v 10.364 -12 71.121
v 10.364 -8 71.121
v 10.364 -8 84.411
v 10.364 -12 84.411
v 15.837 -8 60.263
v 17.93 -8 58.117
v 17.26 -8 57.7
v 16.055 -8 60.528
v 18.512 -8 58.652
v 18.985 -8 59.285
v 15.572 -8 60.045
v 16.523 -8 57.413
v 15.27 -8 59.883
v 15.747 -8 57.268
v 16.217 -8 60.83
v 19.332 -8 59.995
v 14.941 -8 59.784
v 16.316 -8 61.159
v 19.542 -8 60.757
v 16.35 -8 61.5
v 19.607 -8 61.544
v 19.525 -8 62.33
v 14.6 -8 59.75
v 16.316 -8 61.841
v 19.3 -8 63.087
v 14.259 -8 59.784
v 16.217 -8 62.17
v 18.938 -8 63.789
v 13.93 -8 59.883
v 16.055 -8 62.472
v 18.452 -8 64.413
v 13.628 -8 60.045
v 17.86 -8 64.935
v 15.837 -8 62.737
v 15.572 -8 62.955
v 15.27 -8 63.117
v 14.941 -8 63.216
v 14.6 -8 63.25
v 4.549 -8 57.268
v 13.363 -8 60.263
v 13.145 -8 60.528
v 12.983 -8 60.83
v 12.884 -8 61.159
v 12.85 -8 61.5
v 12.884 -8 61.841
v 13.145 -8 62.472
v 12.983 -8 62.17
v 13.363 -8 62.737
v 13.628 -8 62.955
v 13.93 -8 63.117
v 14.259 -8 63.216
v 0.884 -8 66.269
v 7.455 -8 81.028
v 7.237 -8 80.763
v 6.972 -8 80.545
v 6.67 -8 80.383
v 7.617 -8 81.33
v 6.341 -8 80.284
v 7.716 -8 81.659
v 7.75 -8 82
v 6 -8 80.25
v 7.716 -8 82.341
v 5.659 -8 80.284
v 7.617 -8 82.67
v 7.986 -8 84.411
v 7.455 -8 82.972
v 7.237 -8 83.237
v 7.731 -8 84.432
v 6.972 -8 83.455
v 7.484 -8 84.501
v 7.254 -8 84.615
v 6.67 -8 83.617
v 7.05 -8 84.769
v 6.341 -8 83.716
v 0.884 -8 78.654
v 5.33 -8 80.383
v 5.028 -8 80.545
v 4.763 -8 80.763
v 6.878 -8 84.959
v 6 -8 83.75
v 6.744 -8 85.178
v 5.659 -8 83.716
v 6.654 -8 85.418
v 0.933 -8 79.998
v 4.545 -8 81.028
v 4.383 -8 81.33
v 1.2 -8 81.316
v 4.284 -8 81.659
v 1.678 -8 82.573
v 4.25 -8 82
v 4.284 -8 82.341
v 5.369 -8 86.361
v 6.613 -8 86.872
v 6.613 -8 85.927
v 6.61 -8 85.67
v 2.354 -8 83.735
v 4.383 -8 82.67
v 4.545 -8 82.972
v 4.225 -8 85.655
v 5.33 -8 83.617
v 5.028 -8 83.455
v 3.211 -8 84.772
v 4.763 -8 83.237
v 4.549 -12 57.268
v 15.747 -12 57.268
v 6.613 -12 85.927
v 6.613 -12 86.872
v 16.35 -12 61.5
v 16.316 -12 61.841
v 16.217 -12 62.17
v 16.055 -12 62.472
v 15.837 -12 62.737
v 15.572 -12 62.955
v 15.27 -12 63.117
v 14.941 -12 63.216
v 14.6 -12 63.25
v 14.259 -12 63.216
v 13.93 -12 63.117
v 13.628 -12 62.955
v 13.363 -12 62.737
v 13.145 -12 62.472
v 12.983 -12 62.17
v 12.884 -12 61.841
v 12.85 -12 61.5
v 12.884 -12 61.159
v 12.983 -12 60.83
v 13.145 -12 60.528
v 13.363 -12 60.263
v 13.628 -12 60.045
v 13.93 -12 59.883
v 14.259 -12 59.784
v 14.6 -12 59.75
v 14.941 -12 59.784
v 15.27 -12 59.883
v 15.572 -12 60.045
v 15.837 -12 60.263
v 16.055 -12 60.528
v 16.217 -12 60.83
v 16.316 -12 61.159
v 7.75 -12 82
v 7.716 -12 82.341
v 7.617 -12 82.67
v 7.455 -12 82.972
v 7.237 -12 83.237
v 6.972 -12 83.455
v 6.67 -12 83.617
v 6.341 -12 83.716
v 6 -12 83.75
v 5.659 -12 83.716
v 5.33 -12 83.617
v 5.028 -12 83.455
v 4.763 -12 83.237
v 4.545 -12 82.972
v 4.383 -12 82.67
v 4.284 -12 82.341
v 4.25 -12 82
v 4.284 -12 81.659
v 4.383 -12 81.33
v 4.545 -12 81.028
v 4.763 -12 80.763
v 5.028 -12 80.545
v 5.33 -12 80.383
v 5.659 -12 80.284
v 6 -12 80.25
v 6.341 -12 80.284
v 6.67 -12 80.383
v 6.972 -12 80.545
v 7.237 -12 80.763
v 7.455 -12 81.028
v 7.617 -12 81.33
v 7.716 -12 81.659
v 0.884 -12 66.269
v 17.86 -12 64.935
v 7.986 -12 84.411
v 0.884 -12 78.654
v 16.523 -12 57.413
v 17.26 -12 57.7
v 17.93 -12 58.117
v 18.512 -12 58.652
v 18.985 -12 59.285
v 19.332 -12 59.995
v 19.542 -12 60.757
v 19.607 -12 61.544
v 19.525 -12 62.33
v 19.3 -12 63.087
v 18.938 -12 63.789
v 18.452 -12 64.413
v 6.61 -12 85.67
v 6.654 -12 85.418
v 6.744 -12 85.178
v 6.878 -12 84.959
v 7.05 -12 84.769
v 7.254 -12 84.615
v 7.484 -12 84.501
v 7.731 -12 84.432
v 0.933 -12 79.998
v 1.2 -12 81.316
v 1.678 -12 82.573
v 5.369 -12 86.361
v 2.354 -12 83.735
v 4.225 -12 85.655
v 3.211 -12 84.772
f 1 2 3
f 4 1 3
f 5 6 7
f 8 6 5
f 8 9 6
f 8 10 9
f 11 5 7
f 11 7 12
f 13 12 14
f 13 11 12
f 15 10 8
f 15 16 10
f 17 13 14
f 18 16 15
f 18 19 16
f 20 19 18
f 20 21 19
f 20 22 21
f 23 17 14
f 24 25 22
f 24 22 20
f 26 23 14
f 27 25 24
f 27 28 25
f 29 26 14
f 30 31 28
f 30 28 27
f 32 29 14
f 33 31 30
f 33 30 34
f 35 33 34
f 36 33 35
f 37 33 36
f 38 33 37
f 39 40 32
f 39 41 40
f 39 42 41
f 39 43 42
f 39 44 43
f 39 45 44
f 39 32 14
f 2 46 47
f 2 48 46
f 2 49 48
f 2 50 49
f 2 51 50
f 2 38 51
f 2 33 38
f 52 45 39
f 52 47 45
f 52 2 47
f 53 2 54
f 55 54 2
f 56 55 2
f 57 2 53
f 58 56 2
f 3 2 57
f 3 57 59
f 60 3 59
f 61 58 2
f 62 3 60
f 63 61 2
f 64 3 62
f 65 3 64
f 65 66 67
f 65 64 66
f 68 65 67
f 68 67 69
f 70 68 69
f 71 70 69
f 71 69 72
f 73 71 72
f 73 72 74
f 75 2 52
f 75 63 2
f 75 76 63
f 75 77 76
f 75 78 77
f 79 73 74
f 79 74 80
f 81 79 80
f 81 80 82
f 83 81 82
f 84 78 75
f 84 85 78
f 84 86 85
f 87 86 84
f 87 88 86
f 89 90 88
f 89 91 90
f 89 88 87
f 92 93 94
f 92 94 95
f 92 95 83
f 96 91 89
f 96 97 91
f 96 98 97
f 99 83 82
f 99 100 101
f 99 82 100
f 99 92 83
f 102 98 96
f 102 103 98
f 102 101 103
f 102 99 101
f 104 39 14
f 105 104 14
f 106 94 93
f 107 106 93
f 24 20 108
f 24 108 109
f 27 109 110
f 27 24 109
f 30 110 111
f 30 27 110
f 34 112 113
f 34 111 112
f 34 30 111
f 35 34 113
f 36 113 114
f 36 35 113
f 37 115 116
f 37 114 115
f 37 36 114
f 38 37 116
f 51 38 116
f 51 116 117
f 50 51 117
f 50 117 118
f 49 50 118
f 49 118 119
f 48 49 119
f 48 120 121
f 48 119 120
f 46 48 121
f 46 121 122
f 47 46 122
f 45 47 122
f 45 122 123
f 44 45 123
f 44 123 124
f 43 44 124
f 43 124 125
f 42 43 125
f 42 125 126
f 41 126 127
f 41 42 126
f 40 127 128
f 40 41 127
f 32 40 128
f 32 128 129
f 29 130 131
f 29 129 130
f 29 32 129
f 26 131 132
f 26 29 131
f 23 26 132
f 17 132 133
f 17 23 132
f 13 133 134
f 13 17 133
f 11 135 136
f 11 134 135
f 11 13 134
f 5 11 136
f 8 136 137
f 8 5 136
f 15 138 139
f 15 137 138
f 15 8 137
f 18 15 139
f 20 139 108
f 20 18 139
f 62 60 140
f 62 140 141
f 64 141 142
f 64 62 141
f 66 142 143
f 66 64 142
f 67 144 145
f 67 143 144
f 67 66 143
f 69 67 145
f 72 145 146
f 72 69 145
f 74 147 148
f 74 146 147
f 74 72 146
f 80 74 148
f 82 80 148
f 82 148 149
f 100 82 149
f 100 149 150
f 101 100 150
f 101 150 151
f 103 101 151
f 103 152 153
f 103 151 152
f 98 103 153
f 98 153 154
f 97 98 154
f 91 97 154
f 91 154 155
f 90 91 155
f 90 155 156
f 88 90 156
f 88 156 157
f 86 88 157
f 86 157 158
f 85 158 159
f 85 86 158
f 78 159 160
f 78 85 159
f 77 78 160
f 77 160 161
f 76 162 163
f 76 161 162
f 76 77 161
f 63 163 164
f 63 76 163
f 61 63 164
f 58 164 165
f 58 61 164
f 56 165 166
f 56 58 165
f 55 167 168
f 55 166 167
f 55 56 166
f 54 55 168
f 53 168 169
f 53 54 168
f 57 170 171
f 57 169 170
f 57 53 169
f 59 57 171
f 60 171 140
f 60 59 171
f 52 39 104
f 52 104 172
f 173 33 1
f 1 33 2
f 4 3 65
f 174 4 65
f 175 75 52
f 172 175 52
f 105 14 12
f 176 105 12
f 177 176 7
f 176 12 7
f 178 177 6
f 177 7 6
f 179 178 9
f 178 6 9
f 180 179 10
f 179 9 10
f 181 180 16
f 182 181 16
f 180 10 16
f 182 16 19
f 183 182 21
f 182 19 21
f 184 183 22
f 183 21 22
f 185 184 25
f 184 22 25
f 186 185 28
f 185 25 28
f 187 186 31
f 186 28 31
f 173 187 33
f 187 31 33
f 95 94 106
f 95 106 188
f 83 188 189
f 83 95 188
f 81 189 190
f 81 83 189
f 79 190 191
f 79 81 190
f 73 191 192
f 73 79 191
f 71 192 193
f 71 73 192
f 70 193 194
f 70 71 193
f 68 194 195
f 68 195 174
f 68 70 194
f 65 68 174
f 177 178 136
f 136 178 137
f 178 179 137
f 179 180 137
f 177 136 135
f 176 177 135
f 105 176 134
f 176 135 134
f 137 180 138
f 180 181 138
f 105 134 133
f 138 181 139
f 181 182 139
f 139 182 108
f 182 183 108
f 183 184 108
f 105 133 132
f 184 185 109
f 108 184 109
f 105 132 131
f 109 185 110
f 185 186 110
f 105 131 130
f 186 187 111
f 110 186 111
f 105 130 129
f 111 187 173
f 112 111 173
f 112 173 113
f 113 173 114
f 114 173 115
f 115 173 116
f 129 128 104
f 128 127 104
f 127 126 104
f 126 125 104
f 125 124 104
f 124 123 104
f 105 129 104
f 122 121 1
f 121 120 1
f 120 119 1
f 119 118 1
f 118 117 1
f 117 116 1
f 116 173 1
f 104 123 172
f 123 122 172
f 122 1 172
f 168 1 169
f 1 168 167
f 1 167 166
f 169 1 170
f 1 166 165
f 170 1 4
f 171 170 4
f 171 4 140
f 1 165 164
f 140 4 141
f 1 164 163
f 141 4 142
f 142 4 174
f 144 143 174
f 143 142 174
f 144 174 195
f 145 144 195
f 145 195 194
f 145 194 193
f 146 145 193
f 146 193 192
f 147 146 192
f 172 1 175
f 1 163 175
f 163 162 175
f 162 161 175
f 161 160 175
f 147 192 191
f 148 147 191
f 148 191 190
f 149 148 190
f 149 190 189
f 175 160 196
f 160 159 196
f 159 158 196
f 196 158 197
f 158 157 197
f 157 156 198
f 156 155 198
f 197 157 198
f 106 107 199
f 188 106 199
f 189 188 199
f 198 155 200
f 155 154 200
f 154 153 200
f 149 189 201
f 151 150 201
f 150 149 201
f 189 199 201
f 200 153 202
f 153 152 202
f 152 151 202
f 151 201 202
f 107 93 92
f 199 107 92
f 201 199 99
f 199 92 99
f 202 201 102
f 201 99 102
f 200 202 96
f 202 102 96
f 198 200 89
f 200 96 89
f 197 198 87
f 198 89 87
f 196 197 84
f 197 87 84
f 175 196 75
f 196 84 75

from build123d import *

# Parameters (mm, degrees)
CYLINDER058_R     = 1.75
CYLINDER058_DEPTH = 15
CYLINDER057_R     = 1.75
CYLINDER057_DEPTH = 15
EXTRUDE001_DEPTH  = 4


with BuildPart() as m3holds026:
    # Cylinder058 → Cylinder058 (new body)
    with BuildSketch(Plane(origin=(14.6, 0.25, 61.5), x_dir=(1, 0, 0), z_dir=(0, -1, 0))):
        Circle(CYLINDER058_R)
    extrude(amount=CYLINDER058_DEPTH)


with BuildPart() as fusion066:
    # Cylinder057 → Cylinder057 (new body)
    with BuildSketch(Plane(origin=(6, 0.25, 82), x_dir=(1, 0, 0), z_dir=(0, -1, 0))):
        Circle(CYLINDER057_R)
    extrude(amount=CYLINDER057_DEPTH)

    # Fusion066: union m3Holds026
    add(m3holds026.part)


with BuildPart() as c4holdtopleft:
    # Sketch003 → Extrude001 (new body)
    with BuildSketch(Plane.XZ):
        with BuildLine():
            Line((4.549471, 57.267887), (0.883944, 66.268614))
            Line((0.883944, 78.654398), (0.883944, 66.268614))
            ThreePointArc((6.613358, 86.871608), (2.353967, 83.73544), (0.883944, 78.654398))
            Line((6.613358, 85.92654), (6.613358, 86.871608))
            ThreePointArc((6.613358, 85.92654), (6.959213, 84.860057), (7.986391, 84.410718))
            Line((10.364112, 84.410718), (7.986391, 84.410718))
            Line((10.364112, 71.120834), (10.364112, 84.410718))
            Line((17.859817, 64.935078), (10.364112, 71.120834))
            ThreePointArc((15.746783, 57.267887), (19.454521, 60.370821), (17.859817, 64.935078))
            Line((4.549471, 57.267887), (15.746783, 57.267887))
        make_face()
    extrude(amount=EXTRUDE001_DEPTH)


with BuildPart() as c4holdtopleft_1:
    # Extrude001 placement: moved
    add(c4holdtopleft.part.moved(Location((0, -8, 0))))

    # Cut011: cut Fusion066
    add(fusion066.part, mode=Mode.SUBTRACT)


solid = c4holdtopleft_1.part
